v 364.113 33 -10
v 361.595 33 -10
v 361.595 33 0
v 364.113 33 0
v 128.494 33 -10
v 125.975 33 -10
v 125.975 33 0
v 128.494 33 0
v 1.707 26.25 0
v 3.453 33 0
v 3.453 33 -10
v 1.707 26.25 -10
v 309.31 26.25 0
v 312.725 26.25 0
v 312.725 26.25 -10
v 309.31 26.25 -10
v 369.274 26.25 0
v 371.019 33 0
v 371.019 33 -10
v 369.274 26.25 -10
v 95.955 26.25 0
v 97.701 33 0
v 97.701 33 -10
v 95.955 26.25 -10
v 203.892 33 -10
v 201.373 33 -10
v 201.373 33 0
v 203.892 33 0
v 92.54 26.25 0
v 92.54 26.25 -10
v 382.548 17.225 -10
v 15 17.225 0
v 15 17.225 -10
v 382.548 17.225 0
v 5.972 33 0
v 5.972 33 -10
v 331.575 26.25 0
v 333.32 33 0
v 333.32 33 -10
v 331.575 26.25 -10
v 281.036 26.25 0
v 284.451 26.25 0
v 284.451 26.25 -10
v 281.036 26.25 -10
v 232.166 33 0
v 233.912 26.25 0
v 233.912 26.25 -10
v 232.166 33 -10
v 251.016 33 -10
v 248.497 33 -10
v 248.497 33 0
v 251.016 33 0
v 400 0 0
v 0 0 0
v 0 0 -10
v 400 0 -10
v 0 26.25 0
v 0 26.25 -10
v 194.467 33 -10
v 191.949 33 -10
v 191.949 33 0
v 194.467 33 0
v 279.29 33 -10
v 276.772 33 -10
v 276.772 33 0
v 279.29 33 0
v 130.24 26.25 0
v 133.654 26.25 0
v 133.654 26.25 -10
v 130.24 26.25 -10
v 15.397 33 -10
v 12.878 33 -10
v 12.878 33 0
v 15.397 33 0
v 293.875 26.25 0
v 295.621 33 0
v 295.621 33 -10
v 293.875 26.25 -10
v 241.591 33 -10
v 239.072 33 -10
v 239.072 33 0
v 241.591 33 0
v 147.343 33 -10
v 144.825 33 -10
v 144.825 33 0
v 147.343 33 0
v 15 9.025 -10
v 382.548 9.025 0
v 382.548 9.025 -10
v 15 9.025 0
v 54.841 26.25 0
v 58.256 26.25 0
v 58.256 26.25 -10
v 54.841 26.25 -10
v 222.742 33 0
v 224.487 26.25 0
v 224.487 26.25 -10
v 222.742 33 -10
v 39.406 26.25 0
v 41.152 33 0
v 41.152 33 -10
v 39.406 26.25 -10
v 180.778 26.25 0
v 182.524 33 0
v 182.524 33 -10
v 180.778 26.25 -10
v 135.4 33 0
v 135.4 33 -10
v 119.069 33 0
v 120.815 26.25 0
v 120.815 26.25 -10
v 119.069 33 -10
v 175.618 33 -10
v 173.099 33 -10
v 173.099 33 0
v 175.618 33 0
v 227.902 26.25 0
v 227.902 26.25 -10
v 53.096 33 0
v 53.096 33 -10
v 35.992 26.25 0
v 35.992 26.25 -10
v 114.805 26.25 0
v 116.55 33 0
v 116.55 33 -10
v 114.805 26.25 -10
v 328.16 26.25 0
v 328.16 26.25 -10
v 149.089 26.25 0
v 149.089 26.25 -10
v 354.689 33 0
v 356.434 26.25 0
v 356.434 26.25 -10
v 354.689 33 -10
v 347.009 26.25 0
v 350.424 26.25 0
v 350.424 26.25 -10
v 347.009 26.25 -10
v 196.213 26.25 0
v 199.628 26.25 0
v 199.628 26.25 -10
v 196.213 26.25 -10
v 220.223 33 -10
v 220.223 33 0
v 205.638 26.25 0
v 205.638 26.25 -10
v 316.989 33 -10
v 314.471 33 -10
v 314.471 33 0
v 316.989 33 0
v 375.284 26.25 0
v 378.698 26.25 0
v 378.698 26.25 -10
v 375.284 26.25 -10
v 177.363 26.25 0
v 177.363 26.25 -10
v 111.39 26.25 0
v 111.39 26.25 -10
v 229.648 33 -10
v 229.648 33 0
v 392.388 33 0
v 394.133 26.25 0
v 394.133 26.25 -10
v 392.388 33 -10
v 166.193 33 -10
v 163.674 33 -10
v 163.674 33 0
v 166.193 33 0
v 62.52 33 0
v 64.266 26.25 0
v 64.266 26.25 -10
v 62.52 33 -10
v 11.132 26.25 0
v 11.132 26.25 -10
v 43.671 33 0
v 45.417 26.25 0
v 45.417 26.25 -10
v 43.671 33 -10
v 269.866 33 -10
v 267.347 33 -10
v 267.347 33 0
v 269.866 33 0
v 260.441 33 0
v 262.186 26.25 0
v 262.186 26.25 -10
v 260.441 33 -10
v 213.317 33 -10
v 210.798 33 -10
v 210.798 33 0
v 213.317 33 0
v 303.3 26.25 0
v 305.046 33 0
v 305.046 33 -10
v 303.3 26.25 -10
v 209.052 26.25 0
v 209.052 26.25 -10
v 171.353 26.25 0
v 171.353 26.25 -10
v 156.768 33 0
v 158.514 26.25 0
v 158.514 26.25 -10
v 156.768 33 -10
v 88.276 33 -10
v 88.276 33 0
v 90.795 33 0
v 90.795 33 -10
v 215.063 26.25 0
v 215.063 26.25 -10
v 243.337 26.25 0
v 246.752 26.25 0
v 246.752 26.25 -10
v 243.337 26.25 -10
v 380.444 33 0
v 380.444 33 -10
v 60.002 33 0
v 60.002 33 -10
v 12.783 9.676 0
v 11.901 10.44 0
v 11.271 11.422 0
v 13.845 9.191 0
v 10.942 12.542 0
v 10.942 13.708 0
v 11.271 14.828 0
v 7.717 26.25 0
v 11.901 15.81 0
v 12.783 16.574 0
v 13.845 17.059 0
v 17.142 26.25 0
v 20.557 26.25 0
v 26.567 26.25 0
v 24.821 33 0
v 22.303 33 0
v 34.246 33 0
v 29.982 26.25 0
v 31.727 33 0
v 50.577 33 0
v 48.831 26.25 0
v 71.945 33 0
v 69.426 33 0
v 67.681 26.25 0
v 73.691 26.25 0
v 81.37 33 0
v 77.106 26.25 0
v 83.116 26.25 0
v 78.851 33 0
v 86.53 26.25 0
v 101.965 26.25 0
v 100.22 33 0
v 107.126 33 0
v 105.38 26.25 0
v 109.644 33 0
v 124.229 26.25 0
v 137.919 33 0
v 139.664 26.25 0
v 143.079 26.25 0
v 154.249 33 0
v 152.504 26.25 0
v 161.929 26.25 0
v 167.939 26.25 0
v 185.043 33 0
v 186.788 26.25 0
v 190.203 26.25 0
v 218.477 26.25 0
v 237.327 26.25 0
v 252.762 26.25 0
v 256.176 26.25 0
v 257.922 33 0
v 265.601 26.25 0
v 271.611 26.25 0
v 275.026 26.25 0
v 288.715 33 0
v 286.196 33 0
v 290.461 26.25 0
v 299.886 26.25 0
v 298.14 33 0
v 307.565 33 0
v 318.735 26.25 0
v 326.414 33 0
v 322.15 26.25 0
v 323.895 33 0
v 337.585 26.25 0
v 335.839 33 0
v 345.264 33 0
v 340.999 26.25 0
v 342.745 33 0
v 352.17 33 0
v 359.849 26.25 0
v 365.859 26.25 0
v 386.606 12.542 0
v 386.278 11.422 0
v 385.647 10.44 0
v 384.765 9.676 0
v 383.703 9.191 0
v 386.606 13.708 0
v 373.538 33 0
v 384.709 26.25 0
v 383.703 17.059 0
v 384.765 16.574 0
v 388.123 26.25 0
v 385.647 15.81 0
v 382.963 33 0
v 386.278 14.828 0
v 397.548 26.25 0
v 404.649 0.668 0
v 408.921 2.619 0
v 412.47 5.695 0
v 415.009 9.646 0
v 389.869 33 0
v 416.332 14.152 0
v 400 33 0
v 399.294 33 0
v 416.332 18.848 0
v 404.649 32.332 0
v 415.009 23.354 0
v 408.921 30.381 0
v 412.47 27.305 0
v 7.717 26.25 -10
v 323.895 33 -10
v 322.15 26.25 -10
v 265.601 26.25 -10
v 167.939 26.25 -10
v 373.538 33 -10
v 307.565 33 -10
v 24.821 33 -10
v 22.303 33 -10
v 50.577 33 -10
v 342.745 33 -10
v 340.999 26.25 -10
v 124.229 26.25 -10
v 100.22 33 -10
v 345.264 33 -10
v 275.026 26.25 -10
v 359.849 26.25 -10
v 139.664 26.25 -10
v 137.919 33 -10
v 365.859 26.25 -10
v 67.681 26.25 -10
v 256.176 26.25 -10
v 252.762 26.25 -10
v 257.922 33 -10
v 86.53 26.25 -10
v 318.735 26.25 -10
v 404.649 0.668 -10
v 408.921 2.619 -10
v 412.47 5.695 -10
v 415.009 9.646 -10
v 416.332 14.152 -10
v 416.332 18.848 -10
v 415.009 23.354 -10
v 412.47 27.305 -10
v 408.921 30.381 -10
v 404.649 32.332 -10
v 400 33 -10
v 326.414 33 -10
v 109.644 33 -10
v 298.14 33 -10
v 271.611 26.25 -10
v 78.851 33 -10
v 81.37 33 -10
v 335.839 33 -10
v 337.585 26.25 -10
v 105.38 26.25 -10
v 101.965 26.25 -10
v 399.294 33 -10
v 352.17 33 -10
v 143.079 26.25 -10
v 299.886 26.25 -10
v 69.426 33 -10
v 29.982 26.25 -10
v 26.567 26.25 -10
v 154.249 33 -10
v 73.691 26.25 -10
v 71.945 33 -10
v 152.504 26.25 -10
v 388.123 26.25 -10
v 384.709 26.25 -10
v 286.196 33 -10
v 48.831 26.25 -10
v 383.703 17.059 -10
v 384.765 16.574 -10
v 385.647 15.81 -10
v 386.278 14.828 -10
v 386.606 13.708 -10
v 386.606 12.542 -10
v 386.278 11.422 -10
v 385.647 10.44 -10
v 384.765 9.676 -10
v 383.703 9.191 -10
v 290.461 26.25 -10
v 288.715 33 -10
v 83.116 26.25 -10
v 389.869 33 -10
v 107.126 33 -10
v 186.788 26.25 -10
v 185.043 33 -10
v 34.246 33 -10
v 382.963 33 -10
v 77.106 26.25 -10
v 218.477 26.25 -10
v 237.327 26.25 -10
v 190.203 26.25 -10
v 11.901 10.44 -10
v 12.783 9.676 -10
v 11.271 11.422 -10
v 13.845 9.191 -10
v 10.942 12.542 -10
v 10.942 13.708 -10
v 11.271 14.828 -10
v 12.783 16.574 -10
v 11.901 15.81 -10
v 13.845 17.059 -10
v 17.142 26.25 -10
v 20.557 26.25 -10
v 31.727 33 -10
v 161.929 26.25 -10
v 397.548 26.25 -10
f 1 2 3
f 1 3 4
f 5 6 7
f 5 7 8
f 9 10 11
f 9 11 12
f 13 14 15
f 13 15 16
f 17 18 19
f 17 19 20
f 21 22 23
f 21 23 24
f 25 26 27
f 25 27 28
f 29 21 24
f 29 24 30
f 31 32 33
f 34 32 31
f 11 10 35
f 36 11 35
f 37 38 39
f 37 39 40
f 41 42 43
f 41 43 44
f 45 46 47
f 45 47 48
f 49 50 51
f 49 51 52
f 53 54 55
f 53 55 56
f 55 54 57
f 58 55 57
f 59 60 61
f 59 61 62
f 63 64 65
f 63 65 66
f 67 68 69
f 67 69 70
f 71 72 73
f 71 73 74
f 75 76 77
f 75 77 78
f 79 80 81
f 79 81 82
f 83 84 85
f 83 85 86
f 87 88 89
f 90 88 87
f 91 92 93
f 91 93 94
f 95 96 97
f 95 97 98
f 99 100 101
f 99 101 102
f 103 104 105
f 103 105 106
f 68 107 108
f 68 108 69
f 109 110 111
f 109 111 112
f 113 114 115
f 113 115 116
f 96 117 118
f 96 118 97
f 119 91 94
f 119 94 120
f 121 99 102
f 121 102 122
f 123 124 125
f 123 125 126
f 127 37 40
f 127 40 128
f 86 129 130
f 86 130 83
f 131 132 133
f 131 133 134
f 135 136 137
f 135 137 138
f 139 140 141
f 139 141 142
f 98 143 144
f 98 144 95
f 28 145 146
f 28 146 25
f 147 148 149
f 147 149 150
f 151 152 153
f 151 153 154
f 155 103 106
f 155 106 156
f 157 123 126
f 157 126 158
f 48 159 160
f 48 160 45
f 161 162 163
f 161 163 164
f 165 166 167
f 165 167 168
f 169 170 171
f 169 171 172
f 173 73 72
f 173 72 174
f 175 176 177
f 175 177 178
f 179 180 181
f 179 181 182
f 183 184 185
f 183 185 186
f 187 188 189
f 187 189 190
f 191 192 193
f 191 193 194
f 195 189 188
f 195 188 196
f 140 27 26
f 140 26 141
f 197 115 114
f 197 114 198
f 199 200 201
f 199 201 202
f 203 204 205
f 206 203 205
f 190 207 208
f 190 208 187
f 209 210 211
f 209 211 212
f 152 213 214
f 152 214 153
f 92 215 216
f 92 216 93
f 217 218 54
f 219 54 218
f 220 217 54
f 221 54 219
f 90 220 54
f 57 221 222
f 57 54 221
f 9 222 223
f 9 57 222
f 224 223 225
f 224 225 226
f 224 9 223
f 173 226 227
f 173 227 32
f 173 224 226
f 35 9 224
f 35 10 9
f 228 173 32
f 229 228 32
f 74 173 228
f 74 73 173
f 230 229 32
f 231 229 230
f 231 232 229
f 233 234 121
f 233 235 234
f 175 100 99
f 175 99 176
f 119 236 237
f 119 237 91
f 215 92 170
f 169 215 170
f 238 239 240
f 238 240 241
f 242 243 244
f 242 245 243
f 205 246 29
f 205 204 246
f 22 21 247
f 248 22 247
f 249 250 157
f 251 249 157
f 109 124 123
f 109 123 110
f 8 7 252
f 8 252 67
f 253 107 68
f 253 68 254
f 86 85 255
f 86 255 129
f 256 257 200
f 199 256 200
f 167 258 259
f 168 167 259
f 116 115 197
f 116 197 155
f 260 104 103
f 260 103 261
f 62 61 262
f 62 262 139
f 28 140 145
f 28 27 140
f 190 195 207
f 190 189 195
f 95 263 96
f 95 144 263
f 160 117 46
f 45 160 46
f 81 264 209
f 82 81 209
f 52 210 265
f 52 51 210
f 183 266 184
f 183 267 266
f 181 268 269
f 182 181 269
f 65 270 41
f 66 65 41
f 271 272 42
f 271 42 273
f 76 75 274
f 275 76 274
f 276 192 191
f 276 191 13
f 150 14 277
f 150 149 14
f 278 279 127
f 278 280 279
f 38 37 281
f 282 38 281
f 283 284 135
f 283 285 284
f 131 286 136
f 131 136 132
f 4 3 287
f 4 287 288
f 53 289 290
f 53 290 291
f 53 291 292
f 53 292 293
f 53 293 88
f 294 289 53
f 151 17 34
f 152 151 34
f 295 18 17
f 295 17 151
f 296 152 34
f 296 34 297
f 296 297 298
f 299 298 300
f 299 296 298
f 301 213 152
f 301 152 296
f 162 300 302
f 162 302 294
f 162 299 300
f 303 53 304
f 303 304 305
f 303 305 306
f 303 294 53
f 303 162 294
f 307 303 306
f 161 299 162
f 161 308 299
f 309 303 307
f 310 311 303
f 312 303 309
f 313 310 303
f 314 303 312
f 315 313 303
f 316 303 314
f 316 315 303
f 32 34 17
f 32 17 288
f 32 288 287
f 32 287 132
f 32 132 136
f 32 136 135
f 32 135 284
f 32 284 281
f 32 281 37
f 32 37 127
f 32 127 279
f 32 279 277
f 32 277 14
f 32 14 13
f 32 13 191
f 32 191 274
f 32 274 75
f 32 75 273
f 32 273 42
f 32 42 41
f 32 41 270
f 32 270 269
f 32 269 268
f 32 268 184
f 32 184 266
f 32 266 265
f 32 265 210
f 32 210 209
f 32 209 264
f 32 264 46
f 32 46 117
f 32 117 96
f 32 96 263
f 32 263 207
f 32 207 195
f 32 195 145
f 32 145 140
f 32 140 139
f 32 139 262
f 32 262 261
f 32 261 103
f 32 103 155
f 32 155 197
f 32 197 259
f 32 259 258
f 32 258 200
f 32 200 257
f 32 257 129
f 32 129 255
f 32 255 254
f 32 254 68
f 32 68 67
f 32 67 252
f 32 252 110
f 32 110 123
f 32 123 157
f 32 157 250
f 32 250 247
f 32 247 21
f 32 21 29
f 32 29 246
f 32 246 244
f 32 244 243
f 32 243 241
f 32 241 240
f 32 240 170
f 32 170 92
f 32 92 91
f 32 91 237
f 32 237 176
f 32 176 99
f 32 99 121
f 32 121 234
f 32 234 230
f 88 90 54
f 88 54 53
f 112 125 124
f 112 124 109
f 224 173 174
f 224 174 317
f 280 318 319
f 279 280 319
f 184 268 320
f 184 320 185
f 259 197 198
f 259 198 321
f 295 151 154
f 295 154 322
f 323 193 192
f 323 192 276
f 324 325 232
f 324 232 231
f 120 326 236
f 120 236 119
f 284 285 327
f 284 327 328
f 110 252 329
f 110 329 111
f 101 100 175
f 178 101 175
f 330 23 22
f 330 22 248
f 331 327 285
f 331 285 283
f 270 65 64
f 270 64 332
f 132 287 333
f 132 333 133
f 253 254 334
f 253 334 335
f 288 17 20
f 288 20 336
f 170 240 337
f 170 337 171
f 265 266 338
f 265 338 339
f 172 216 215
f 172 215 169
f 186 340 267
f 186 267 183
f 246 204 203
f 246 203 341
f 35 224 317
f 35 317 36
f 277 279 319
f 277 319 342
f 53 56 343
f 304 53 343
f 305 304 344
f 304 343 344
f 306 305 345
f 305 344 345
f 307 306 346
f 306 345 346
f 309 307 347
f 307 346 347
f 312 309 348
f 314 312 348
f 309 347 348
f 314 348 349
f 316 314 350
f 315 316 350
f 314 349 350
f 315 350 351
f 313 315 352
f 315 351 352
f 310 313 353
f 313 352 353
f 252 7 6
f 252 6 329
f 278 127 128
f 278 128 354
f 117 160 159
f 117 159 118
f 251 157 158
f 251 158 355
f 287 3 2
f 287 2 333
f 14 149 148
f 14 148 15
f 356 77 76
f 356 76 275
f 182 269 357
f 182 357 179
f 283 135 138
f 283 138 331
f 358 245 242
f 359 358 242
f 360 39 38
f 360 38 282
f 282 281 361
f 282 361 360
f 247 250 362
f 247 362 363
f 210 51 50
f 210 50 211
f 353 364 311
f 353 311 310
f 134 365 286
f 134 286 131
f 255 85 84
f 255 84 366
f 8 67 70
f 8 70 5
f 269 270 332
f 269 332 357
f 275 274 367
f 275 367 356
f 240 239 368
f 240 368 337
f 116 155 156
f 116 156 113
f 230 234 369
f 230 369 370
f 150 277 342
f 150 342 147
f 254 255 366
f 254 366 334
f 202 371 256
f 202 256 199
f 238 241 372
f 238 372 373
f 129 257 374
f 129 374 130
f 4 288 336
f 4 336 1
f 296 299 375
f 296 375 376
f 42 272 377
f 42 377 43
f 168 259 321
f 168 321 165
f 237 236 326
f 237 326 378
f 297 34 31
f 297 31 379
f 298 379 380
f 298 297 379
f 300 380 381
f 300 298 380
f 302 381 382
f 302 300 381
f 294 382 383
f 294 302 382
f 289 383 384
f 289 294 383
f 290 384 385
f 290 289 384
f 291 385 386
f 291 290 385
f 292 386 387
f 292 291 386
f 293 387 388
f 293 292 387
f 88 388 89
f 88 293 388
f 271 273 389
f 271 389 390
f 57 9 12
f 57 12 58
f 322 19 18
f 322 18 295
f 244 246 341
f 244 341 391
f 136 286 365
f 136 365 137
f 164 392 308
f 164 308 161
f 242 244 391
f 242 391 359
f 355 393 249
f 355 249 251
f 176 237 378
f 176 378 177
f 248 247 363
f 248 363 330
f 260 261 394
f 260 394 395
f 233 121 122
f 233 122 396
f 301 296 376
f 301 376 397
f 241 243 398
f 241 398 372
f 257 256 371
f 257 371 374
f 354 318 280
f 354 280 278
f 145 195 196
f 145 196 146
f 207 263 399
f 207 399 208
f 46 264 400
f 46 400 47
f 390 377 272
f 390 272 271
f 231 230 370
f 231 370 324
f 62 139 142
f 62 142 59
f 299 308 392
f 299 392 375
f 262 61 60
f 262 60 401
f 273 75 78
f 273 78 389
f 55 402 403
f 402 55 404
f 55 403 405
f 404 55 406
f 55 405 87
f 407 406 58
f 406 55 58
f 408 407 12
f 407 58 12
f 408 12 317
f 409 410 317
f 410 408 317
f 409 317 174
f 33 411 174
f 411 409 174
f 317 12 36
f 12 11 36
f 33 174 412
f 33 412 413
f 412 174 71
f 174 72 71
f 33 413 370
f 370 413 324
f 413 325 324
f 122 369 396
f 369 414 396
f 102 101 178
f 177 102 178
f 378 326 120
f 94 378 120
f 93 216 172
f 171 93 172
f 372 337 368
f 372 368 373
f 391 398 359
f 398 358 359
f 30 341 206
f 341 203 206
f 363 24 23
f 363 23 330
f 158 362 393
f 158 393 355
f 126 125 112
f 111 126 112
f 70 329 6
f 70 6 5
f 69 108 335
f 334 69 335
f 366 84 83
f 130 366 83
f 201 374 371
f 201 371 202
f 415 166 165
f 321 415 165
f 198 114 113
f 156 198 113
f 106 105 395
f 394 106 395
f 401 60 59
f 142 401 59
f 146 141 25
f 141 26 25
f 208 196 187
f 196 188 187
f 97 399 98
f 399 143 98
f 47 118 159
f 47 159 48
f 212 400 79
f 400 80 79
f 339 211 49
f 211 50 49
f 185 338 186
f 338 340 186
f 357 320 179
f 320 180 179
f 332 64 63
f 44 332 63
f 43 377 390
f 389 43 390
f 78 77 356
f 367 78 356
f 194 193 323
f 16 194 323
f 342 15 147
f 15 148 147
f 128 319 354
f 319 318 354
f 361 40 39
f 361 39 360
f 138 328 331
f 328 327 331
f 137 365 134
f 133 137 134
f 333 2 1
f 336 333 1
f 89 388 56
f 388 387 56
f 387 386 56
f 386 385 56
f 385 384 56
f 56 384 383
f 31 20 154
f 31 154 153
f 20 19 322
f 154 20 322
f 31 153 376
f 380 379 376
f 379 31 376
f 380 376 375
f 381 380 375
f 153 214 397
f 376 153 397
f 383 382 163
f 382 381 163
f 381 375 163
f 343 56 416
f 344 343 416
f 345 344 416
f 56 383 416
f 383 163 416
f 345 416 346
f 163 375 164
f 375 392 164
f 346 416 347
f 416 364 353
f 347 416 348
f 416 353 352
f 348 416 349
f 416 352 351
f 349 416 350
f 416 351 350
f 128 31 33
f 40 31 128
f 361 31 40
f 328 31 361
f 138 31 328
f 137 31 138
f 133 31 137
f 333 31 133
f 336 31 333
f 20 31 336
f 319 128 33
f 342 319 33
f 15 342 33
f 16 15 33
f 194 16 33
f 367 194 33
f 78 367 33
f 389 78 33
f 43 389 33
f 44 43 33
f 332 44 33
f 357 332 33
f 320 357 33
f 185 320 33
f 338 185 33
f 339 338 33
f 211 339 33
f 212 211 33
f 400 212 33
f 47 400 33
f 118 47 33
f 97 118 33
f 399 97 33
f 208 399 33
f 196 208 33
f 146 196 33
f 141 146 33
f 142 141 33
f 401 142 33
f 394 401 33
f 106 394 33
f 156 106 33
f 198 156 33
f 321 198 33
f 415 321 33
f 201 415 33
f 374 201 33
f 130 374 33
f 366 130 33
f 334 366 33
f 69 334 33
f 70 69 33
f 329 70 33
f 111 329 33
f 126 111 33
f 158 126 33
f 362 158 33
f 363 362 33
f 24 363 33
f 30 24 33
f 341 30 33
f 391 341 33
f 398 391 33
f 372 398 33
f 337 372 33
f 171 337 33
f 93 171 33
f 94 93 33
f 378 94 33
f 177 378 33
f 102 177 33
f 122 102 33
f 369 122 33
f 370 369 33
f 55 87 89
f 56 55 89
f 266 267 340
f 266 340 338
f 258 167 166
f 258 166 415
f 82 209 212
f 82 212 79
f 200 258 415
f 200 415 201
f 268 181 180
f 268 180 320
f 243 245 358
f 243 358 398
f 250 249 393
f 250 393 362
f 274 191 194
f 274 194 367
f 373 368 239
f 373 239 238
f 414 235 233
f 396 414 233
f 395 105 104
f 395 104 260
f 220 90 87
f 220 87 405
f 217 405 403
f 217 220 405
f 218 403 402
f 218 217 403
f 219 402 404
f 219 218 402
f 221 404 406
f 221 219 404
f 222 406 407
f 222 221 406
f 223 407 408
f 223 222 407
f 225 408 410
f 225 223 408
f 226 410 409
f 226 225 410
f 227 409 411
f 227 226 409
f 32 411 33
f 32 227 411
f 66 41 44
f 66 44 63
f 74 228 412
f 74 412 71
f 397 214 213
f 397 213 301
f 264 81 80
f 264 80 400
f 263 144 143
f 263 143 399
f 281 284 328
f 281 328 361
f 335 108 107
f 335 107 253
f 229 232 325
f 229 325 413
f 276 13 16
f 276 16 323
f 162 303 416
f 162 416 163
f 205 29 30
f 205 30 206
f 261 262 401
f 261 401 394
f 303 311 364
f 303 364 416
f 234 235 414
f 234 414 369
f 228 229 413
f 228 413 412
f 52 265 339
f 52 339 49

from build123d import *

# Parameters (mm, degrees)
BLANKSKE_W          = 400
BLANKSKE_H          = 33
BLANK_DEPTH         = 10
TOOTHCUTSIM_DEPTH   = 402.483499038
TEETHCUTS_COUNT     = 43
TEETHCUTS_PITCH     = 9.42477795
CUT_EXTRUDE1_DEPTH  = 402.483499038
BOSS_EXTRUDE1_DEPTH = 10


with BuildPart() as part:
    # BlankSke → Blank (new body)
    with BuildSketch(Plane.XY):
        with Locations((200, 16.5)):
            Rectangle(BLANKSKE_W, BLANKSKE_H)
    extrude(amount=-BLANK_DEPTH)

    # TooCutSkeSim → ToothCutSim (cut, through all)
    with BuildSketch(Plane.XY):
        Polygon((1.707378546, 26.25), (-1.707378546, 26.25), (-3.459616127, 33.0254), (3.459616127, 33.0254), align=None)
    toothcutsim = extrude(amount=-TOOTHCUTSIM_DEPTH, mode=Mode.SUBTRACT)

    # TeethCuts: ToothCutSim ×43
    with Locations(*[(i * TEETHCUTS_PITCH, 0, 0) for i in range(1, TEETHCUTS_COUNT)]):
        add(toothcutsim, mode=Mode.SUBTRACT)

    # Sketch1 → Cut-Extrude1 (cut, through all)
    with BuildSketch(Plane.XY):
        with BuildLine():
            Line((15, 17.225), (382.548052446, 17.225))
            ThreePointArc((382.548052446, 17.225), (386.648052446, 13.125), (382.548052446, 9.025))
            Line((382.548052446, 9.025), (15, 9.025))
            ThreePointArc((15, 9.025), (10.9, 13.125), (15, 17.225))
        make_face()
    extrude(amount=-CUT_EXTRUDE1_DEPTH, mode=Mode.SUBTRACT)

    # Sketch2 → Boss-Extrude1 (add)
    with BuildSketch(Plane(origin=(0, 0, -10), x_dir=(-1, 0, 0), z_dir=(0, 0, -1))):
        with BuildLine():
            Line((-400, 33), (-400, 0))
            ThreePointArc((-400, 0), (-416.5, 16.5), (-400, 33))
        make_face()
    extrude(amount=-BOSS_EXTRUDE1_DEPTH)


solid = part.part
